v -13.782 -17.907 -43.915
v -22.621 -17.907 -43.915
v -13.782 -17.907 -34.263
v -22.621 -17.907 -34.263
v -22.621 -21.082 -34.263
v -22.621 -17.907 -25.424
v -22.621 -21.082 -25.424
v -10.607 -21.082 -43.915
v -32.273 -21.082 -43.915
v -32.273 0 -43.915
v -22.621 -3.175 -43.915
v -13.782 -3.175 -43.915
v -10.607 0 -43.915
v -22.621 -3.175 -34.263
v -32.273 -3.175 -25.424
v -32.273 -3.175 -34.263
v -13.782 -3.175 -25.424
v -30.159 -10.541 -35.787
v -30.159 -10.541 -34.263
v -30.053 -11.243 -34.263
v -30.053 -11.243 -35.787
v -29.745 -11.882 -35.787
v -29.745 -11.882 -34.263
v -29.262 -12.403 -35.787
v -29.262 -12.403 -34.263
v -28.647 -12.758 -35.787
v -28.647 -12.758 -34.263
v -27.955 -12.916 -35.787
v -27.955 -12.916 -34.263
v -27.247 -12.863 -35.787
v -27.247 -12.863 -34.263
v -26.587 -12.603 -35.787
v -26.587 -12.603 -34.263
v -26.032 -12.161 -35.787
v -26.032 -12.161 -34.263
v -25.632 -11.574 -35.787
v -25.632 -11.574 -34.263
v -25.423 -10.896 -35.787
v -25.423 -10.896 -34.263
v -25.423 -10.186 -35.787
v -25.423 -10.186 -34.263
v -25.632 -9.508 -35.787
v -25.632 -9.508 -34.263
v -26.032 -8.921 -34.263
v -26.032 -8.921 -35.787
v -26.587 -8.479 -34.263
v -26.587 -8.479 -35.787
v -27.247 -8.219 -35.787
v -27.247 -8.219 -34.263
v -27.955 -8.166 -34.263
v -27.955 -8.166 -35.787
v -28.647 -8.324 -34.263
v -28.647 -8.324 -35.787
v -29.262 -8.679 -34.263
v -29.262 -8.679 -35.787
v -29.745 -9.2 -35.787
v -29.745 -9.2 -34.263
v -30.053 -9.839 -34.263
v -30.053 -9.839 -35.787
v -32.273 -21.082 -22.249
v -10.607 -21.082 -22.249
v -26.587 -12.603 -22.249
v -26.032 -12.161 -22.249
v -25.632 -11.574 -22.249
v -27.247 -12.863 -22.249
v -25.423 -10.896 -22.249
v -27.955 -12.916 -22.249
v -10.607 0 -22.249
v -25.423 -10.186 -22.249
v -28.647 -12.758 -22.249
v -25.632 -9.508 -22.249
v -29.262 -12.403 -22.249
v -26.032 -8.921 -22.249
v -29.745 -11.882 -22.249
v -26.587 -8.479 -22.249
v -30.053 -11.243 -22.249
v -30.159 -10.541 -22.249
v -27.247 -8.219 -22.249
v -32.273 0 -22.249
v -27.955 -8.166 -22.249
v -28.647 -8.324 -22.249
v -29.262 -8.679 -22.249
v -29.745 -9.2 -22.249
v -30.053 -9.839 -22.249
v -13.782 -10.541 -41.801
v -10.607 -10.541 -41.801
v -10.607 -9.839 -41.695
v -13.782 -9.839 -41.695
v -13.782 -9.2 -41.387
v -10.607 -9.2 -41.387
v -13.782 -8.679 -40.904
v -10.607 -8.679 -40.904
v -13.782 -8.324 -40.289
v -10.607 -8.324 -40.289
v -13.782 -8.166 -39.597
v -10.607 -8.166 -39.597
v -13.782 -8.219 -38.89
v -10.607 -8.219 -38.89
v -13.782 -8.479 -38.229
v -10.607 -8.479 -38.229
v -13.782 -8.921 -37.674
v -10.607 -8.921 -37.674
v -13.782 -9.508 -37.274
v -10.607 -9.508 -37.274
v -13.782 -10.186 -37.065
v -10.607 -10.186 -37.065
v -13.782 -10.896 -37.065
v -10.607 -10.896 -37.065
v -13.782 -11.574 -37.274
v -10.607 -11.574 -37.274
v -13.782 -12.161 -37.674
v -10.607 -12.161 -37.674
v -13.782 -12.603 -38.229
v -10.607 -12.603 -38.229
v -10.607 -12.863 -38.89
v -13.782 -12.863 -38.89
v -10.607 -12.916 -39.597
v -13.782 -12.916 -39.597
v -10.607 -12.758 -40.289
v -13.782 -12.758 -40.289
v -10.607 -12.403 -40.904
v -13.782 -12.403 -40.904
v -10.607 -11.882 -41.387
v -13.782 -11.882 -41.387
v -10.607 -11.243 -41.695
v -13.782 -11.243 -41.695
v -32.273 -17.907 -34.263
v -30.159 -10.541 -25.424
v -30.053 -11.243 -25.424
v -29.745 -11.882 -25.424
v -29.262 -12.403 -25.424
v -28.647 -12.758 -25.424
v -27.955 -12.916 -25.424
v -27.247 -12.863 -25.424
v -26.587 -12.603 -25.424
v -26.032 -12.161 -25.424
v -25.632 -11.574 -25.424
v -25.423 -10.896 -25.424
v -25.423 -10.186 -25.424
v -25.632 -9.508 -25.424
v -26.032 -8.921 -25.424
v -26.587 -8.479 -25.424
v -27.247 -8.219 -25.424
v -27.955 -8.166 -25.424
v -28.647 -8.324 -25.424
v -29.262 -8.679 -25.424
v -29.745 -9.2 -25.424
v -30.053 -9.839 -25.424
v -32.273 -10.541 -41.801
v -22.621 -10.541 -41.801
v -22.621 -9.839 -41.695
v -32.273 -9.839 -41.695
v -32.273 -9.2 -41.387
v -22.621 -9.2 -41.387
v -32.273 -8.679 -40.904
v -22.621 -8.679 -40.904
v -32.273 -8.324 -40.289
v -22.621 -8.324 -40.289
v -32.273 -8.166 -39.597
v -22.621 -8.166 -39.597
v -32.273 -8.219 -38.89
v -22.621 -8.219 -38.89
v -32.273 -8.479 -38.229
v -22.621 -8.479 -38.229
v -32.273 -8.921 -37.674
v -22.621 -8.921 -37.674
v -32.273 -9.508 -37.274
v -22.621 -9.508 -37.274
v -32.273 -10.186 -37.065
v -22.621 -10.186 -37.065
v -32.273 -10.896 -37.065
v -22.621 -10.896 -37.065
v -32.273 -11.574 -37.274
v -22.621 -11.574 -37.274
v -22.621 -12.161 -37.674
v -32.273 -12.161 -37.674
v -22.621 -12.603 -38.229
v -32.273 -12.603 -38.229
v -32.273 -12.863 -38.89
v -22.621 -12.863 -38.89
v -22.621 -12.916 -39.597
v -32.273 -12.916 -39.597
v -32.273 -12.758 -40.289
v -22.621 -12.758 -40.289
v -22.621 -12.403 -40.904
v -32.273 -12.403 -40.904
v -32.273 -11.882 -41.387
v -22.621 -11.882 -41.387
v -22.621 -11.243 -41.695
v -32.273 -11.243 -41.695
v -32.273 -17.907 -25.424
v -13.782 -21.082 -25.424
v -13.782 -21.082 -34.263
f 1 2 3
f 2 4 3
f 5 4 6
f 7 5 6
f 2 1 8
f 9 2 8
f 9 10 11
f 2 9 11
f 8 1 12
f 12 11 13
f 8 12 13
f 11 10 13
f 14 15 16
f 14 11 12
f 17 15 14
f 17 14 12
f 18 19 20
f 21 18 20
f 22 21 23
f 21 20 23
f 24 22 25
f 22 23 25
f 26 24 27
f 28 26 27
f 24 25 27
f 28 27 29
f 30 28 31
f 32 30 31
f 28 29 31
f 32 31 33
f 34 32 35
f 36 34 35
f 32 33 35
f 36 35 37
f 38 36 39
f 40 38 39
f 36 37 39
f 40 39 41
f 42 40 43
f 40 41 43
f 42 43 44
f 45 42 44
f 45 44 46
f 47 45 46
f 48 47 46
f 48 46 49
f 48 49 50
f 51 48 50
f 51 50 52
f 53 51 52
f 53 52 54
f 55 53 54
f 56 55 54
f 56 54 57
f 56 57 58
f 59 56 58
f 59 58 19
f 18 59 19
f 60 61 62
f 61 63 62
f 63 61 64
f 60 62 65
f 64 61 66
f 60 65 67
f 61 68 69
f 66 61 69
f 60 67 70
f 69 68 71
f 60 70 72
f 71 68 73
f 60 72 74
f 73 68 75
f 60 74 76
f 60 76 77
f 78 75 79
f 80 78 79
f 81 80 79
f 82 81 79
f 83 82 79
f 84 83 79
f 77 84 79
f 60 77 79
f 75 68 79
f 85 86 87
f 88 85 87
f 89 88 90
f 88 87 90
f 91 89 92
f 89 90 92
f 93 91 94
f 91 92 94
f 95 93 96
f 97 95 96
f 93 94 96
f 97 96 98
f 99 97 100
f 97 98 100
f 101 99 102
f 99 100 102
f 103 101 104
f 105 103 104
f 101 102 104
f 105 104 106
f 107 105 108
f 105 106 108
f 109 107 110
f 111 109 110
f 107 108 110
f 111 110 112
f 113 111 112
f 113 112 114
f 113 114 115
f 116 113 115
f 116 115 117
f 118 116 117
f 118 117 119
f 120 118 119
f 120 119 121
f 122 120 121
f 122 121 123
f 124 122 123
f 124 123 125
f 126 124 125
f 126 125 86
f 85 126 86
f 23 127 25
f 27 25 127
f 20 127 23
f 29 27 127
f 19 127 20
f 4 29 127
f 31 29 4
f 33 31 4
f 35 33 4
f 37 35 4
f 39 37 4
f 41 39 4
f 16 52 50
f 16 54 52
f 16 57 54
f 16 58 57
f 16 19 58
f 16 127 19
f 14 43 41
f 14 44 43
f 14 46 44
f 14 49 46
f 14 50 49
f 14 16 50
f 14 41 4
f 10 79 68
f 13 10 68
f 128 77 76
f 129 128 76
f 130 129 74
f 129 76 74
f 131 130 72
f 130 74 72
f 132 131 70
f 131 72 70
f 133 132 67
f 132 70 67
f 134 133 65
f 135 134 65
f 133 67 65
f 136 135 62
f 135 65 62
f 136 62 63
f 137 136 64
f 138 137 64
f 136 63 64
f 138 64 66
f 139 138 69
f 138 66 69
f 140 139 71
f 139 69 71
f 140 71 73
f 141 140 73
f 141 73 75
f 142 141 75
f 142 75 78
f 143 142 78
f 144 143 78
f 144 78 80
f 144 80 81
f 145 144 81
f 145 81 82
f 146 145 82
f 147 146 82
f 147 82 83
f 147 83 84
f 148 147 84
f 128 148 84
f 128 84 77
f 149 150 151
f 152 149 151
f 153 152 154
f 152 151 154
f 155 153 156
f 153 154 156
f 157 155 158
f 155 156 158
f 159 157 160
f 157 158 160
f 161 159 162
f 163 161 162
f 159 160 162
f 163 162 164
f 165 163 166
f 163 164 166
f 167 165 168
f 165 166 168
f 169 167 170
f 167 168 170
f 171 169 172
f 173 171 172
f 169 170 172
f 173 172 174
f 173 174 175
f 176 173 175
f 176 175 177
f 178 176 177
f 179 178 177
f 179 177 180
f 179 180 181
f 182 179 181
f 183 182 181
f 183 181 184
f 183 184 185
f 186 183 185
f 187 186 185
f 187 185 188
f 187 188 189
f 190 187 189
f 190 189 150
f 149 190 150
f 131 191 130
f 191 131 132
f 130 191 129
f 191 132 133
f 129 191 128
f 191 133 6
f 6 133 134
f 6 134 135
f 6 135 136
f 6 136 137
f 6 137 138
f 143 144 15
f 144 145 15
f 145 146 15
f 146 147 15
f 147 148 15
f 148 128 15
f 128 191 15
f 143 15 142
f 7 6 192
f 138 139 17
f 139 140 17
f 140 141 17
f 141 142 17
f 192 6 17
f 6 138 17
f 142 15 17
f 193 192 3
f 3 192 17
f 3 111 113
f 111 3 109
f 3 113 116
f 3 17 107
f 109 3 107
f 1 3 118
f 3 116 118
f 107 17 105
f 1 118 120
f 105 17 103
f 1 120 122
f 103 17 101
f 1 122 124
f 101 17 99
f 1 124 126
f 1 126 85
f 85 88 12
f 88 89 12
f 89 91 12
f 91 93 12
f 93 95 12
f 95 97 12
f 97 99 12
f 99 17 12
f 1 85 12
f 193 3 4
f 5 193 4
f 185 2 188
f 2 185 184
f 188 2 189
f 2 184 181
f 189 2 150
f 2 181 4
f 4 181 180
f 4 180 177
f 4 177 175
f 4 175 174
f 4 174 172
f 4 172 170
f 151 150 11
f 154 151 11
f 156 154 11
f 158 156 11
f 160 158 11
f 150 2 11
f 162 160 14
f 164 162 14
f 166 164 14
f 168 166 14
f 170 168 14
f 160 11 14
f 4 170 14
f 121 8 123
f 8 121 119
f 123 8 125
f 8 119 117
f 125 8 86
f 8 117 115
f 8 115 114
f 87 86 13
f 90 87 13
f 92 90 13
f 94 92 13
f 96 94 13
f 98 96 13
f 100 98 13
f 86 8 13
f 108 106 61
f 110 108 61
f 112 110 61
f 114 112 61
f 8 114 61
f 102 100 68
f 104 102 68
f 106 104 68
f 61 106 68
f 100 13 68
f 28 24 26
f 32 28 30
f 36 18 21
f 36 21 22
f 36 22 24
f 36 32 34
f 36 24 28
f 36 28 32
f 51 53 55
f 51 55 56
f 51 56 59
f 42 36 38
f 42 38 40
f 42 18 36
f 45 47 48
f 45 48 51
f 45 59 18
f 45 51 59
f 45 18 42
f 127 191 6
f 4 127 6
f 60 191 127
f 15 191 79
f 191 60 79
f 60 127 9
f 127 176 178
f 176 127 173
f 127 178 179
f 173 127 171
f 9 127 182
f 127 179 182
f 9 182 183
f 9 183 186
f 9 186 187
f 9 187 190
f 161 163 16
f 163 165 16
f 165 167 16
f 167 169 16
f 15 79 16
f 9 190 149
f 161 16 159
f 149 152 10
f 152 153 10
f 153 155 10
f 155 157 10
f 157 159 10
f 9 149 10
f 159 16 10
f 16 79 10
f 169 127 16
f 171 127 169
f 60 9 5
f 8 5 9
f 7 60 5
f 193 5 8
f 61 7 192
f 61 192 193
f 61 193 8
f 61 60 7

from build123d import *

# Parameters (mm, degrees)
F0_W     = 21.6662
F0_H     = 21.6662
F1_DEPTH = 3.175
F2_W     = 18.4912
F2_H     = 3.175
F2_W_2   = 9.652
F2_H_2   = 9.652
F3_DEPTH = 14.732
F5_DEPTH = 13.5382
F7_DEPTH = 25.4
F9_DEPTH = 3.175


# Not quite as in the source:
# - a length typed as a fraction of an inch, garbled in the dataset ("3 / 203.2 mm" for 3/8 in), is restored


with BuildPart() as f1:
    # F0 (on Front) → F1 (new body)
    with BuildSketch(Plane.XZ):
        with Locations((-21.4400560975, -33.0820980474)):
            Rectangle(F0_W, F0_H)
    extrude(amount=F1_DEPTH)

    # F2 (on face) → F3 (join)
    with BuildSketch(Plane.XZ.offset(3.175)):
        with Locations((-23.0275560975, -23.8364980474)):
            Rectangle(F2_W, F2_H)
        Polygon((-13.7819560975, -22.2489980474), (-13.7819560975, -25.4239980474), (-13.7819560975, -43.9151980474), (-10.6069560975, -43.9151980474), (-10.6069560975, -22.2489980474), align=None)
        with Locations((-27.4471560975, -39.0891980474)):
            Rectangle(F2_W_2, F2_H_2)
    extrude(amount=F3_DEPTH)

    # F4 (on face) → F5 (cut)
    with BuildSketch(Plane.XY.offset(-22.2489980474)):
        with BuildLine():
            ThreePointArc((-25.3961060975, -10.541), (-27.7773560975, -8.15975), (-30.1586060975, -10.541))
            ThreePointArc((-30.1586060975, -10.541), (-27.7773560975, -12.92225), (-25.3961060975, -10.541))
        make_face()
    extrude(amount=-F5_DEPTH, mode=Mode.SUBTRACT)

    # F6 (on face) → F7 (cut)
    with BuildSketch(Plane.YZ.offset(-10.6069560975)):
        with BuildLine():
            ThreePointArc((-8.15975, -39.4193980474), (-12.2247980227, -37.7356000247), (-10.541, -41.8006480474))
            ThreePointArc((-10.541, -41.8006480474), (-8.8572019773, -41.1031960701), (-8.15975, -39.4193980474))
        make_face()
    extrude(amount=-F7_DEPTH, mode=Mode.SUBTRACT)

    # F8 (on face) → F9 (join)
    with BuildSketch(Plane.XZ.offset(17.907)):
        Polygon((-10.6069560975, -43.9151980474), (-10.6069560975, -22.2489980474), (-32.2731560975, -22.2489980474), (-32.2731560975, -25.4239980474), (-22.6211560975, -25.4239980474), (-13.7819560975, -25.4239980474), (-13.7819560975, -34.2631980474), (-13.7819560975, -43.9151980474), align=None)
        Polygon((-22.6211560975, -25.4239980474), (-32.2731560975, -25.4239980474), (-32.2731560975, -43.9151980474), (-13.7819560975, -43.9151980474), (-13.7819560975, -34.2631980474), (-22.6211560975, -34.2631980474), align=None)
    extrude(amount=F9_DEPTH)


solid = f1.part
